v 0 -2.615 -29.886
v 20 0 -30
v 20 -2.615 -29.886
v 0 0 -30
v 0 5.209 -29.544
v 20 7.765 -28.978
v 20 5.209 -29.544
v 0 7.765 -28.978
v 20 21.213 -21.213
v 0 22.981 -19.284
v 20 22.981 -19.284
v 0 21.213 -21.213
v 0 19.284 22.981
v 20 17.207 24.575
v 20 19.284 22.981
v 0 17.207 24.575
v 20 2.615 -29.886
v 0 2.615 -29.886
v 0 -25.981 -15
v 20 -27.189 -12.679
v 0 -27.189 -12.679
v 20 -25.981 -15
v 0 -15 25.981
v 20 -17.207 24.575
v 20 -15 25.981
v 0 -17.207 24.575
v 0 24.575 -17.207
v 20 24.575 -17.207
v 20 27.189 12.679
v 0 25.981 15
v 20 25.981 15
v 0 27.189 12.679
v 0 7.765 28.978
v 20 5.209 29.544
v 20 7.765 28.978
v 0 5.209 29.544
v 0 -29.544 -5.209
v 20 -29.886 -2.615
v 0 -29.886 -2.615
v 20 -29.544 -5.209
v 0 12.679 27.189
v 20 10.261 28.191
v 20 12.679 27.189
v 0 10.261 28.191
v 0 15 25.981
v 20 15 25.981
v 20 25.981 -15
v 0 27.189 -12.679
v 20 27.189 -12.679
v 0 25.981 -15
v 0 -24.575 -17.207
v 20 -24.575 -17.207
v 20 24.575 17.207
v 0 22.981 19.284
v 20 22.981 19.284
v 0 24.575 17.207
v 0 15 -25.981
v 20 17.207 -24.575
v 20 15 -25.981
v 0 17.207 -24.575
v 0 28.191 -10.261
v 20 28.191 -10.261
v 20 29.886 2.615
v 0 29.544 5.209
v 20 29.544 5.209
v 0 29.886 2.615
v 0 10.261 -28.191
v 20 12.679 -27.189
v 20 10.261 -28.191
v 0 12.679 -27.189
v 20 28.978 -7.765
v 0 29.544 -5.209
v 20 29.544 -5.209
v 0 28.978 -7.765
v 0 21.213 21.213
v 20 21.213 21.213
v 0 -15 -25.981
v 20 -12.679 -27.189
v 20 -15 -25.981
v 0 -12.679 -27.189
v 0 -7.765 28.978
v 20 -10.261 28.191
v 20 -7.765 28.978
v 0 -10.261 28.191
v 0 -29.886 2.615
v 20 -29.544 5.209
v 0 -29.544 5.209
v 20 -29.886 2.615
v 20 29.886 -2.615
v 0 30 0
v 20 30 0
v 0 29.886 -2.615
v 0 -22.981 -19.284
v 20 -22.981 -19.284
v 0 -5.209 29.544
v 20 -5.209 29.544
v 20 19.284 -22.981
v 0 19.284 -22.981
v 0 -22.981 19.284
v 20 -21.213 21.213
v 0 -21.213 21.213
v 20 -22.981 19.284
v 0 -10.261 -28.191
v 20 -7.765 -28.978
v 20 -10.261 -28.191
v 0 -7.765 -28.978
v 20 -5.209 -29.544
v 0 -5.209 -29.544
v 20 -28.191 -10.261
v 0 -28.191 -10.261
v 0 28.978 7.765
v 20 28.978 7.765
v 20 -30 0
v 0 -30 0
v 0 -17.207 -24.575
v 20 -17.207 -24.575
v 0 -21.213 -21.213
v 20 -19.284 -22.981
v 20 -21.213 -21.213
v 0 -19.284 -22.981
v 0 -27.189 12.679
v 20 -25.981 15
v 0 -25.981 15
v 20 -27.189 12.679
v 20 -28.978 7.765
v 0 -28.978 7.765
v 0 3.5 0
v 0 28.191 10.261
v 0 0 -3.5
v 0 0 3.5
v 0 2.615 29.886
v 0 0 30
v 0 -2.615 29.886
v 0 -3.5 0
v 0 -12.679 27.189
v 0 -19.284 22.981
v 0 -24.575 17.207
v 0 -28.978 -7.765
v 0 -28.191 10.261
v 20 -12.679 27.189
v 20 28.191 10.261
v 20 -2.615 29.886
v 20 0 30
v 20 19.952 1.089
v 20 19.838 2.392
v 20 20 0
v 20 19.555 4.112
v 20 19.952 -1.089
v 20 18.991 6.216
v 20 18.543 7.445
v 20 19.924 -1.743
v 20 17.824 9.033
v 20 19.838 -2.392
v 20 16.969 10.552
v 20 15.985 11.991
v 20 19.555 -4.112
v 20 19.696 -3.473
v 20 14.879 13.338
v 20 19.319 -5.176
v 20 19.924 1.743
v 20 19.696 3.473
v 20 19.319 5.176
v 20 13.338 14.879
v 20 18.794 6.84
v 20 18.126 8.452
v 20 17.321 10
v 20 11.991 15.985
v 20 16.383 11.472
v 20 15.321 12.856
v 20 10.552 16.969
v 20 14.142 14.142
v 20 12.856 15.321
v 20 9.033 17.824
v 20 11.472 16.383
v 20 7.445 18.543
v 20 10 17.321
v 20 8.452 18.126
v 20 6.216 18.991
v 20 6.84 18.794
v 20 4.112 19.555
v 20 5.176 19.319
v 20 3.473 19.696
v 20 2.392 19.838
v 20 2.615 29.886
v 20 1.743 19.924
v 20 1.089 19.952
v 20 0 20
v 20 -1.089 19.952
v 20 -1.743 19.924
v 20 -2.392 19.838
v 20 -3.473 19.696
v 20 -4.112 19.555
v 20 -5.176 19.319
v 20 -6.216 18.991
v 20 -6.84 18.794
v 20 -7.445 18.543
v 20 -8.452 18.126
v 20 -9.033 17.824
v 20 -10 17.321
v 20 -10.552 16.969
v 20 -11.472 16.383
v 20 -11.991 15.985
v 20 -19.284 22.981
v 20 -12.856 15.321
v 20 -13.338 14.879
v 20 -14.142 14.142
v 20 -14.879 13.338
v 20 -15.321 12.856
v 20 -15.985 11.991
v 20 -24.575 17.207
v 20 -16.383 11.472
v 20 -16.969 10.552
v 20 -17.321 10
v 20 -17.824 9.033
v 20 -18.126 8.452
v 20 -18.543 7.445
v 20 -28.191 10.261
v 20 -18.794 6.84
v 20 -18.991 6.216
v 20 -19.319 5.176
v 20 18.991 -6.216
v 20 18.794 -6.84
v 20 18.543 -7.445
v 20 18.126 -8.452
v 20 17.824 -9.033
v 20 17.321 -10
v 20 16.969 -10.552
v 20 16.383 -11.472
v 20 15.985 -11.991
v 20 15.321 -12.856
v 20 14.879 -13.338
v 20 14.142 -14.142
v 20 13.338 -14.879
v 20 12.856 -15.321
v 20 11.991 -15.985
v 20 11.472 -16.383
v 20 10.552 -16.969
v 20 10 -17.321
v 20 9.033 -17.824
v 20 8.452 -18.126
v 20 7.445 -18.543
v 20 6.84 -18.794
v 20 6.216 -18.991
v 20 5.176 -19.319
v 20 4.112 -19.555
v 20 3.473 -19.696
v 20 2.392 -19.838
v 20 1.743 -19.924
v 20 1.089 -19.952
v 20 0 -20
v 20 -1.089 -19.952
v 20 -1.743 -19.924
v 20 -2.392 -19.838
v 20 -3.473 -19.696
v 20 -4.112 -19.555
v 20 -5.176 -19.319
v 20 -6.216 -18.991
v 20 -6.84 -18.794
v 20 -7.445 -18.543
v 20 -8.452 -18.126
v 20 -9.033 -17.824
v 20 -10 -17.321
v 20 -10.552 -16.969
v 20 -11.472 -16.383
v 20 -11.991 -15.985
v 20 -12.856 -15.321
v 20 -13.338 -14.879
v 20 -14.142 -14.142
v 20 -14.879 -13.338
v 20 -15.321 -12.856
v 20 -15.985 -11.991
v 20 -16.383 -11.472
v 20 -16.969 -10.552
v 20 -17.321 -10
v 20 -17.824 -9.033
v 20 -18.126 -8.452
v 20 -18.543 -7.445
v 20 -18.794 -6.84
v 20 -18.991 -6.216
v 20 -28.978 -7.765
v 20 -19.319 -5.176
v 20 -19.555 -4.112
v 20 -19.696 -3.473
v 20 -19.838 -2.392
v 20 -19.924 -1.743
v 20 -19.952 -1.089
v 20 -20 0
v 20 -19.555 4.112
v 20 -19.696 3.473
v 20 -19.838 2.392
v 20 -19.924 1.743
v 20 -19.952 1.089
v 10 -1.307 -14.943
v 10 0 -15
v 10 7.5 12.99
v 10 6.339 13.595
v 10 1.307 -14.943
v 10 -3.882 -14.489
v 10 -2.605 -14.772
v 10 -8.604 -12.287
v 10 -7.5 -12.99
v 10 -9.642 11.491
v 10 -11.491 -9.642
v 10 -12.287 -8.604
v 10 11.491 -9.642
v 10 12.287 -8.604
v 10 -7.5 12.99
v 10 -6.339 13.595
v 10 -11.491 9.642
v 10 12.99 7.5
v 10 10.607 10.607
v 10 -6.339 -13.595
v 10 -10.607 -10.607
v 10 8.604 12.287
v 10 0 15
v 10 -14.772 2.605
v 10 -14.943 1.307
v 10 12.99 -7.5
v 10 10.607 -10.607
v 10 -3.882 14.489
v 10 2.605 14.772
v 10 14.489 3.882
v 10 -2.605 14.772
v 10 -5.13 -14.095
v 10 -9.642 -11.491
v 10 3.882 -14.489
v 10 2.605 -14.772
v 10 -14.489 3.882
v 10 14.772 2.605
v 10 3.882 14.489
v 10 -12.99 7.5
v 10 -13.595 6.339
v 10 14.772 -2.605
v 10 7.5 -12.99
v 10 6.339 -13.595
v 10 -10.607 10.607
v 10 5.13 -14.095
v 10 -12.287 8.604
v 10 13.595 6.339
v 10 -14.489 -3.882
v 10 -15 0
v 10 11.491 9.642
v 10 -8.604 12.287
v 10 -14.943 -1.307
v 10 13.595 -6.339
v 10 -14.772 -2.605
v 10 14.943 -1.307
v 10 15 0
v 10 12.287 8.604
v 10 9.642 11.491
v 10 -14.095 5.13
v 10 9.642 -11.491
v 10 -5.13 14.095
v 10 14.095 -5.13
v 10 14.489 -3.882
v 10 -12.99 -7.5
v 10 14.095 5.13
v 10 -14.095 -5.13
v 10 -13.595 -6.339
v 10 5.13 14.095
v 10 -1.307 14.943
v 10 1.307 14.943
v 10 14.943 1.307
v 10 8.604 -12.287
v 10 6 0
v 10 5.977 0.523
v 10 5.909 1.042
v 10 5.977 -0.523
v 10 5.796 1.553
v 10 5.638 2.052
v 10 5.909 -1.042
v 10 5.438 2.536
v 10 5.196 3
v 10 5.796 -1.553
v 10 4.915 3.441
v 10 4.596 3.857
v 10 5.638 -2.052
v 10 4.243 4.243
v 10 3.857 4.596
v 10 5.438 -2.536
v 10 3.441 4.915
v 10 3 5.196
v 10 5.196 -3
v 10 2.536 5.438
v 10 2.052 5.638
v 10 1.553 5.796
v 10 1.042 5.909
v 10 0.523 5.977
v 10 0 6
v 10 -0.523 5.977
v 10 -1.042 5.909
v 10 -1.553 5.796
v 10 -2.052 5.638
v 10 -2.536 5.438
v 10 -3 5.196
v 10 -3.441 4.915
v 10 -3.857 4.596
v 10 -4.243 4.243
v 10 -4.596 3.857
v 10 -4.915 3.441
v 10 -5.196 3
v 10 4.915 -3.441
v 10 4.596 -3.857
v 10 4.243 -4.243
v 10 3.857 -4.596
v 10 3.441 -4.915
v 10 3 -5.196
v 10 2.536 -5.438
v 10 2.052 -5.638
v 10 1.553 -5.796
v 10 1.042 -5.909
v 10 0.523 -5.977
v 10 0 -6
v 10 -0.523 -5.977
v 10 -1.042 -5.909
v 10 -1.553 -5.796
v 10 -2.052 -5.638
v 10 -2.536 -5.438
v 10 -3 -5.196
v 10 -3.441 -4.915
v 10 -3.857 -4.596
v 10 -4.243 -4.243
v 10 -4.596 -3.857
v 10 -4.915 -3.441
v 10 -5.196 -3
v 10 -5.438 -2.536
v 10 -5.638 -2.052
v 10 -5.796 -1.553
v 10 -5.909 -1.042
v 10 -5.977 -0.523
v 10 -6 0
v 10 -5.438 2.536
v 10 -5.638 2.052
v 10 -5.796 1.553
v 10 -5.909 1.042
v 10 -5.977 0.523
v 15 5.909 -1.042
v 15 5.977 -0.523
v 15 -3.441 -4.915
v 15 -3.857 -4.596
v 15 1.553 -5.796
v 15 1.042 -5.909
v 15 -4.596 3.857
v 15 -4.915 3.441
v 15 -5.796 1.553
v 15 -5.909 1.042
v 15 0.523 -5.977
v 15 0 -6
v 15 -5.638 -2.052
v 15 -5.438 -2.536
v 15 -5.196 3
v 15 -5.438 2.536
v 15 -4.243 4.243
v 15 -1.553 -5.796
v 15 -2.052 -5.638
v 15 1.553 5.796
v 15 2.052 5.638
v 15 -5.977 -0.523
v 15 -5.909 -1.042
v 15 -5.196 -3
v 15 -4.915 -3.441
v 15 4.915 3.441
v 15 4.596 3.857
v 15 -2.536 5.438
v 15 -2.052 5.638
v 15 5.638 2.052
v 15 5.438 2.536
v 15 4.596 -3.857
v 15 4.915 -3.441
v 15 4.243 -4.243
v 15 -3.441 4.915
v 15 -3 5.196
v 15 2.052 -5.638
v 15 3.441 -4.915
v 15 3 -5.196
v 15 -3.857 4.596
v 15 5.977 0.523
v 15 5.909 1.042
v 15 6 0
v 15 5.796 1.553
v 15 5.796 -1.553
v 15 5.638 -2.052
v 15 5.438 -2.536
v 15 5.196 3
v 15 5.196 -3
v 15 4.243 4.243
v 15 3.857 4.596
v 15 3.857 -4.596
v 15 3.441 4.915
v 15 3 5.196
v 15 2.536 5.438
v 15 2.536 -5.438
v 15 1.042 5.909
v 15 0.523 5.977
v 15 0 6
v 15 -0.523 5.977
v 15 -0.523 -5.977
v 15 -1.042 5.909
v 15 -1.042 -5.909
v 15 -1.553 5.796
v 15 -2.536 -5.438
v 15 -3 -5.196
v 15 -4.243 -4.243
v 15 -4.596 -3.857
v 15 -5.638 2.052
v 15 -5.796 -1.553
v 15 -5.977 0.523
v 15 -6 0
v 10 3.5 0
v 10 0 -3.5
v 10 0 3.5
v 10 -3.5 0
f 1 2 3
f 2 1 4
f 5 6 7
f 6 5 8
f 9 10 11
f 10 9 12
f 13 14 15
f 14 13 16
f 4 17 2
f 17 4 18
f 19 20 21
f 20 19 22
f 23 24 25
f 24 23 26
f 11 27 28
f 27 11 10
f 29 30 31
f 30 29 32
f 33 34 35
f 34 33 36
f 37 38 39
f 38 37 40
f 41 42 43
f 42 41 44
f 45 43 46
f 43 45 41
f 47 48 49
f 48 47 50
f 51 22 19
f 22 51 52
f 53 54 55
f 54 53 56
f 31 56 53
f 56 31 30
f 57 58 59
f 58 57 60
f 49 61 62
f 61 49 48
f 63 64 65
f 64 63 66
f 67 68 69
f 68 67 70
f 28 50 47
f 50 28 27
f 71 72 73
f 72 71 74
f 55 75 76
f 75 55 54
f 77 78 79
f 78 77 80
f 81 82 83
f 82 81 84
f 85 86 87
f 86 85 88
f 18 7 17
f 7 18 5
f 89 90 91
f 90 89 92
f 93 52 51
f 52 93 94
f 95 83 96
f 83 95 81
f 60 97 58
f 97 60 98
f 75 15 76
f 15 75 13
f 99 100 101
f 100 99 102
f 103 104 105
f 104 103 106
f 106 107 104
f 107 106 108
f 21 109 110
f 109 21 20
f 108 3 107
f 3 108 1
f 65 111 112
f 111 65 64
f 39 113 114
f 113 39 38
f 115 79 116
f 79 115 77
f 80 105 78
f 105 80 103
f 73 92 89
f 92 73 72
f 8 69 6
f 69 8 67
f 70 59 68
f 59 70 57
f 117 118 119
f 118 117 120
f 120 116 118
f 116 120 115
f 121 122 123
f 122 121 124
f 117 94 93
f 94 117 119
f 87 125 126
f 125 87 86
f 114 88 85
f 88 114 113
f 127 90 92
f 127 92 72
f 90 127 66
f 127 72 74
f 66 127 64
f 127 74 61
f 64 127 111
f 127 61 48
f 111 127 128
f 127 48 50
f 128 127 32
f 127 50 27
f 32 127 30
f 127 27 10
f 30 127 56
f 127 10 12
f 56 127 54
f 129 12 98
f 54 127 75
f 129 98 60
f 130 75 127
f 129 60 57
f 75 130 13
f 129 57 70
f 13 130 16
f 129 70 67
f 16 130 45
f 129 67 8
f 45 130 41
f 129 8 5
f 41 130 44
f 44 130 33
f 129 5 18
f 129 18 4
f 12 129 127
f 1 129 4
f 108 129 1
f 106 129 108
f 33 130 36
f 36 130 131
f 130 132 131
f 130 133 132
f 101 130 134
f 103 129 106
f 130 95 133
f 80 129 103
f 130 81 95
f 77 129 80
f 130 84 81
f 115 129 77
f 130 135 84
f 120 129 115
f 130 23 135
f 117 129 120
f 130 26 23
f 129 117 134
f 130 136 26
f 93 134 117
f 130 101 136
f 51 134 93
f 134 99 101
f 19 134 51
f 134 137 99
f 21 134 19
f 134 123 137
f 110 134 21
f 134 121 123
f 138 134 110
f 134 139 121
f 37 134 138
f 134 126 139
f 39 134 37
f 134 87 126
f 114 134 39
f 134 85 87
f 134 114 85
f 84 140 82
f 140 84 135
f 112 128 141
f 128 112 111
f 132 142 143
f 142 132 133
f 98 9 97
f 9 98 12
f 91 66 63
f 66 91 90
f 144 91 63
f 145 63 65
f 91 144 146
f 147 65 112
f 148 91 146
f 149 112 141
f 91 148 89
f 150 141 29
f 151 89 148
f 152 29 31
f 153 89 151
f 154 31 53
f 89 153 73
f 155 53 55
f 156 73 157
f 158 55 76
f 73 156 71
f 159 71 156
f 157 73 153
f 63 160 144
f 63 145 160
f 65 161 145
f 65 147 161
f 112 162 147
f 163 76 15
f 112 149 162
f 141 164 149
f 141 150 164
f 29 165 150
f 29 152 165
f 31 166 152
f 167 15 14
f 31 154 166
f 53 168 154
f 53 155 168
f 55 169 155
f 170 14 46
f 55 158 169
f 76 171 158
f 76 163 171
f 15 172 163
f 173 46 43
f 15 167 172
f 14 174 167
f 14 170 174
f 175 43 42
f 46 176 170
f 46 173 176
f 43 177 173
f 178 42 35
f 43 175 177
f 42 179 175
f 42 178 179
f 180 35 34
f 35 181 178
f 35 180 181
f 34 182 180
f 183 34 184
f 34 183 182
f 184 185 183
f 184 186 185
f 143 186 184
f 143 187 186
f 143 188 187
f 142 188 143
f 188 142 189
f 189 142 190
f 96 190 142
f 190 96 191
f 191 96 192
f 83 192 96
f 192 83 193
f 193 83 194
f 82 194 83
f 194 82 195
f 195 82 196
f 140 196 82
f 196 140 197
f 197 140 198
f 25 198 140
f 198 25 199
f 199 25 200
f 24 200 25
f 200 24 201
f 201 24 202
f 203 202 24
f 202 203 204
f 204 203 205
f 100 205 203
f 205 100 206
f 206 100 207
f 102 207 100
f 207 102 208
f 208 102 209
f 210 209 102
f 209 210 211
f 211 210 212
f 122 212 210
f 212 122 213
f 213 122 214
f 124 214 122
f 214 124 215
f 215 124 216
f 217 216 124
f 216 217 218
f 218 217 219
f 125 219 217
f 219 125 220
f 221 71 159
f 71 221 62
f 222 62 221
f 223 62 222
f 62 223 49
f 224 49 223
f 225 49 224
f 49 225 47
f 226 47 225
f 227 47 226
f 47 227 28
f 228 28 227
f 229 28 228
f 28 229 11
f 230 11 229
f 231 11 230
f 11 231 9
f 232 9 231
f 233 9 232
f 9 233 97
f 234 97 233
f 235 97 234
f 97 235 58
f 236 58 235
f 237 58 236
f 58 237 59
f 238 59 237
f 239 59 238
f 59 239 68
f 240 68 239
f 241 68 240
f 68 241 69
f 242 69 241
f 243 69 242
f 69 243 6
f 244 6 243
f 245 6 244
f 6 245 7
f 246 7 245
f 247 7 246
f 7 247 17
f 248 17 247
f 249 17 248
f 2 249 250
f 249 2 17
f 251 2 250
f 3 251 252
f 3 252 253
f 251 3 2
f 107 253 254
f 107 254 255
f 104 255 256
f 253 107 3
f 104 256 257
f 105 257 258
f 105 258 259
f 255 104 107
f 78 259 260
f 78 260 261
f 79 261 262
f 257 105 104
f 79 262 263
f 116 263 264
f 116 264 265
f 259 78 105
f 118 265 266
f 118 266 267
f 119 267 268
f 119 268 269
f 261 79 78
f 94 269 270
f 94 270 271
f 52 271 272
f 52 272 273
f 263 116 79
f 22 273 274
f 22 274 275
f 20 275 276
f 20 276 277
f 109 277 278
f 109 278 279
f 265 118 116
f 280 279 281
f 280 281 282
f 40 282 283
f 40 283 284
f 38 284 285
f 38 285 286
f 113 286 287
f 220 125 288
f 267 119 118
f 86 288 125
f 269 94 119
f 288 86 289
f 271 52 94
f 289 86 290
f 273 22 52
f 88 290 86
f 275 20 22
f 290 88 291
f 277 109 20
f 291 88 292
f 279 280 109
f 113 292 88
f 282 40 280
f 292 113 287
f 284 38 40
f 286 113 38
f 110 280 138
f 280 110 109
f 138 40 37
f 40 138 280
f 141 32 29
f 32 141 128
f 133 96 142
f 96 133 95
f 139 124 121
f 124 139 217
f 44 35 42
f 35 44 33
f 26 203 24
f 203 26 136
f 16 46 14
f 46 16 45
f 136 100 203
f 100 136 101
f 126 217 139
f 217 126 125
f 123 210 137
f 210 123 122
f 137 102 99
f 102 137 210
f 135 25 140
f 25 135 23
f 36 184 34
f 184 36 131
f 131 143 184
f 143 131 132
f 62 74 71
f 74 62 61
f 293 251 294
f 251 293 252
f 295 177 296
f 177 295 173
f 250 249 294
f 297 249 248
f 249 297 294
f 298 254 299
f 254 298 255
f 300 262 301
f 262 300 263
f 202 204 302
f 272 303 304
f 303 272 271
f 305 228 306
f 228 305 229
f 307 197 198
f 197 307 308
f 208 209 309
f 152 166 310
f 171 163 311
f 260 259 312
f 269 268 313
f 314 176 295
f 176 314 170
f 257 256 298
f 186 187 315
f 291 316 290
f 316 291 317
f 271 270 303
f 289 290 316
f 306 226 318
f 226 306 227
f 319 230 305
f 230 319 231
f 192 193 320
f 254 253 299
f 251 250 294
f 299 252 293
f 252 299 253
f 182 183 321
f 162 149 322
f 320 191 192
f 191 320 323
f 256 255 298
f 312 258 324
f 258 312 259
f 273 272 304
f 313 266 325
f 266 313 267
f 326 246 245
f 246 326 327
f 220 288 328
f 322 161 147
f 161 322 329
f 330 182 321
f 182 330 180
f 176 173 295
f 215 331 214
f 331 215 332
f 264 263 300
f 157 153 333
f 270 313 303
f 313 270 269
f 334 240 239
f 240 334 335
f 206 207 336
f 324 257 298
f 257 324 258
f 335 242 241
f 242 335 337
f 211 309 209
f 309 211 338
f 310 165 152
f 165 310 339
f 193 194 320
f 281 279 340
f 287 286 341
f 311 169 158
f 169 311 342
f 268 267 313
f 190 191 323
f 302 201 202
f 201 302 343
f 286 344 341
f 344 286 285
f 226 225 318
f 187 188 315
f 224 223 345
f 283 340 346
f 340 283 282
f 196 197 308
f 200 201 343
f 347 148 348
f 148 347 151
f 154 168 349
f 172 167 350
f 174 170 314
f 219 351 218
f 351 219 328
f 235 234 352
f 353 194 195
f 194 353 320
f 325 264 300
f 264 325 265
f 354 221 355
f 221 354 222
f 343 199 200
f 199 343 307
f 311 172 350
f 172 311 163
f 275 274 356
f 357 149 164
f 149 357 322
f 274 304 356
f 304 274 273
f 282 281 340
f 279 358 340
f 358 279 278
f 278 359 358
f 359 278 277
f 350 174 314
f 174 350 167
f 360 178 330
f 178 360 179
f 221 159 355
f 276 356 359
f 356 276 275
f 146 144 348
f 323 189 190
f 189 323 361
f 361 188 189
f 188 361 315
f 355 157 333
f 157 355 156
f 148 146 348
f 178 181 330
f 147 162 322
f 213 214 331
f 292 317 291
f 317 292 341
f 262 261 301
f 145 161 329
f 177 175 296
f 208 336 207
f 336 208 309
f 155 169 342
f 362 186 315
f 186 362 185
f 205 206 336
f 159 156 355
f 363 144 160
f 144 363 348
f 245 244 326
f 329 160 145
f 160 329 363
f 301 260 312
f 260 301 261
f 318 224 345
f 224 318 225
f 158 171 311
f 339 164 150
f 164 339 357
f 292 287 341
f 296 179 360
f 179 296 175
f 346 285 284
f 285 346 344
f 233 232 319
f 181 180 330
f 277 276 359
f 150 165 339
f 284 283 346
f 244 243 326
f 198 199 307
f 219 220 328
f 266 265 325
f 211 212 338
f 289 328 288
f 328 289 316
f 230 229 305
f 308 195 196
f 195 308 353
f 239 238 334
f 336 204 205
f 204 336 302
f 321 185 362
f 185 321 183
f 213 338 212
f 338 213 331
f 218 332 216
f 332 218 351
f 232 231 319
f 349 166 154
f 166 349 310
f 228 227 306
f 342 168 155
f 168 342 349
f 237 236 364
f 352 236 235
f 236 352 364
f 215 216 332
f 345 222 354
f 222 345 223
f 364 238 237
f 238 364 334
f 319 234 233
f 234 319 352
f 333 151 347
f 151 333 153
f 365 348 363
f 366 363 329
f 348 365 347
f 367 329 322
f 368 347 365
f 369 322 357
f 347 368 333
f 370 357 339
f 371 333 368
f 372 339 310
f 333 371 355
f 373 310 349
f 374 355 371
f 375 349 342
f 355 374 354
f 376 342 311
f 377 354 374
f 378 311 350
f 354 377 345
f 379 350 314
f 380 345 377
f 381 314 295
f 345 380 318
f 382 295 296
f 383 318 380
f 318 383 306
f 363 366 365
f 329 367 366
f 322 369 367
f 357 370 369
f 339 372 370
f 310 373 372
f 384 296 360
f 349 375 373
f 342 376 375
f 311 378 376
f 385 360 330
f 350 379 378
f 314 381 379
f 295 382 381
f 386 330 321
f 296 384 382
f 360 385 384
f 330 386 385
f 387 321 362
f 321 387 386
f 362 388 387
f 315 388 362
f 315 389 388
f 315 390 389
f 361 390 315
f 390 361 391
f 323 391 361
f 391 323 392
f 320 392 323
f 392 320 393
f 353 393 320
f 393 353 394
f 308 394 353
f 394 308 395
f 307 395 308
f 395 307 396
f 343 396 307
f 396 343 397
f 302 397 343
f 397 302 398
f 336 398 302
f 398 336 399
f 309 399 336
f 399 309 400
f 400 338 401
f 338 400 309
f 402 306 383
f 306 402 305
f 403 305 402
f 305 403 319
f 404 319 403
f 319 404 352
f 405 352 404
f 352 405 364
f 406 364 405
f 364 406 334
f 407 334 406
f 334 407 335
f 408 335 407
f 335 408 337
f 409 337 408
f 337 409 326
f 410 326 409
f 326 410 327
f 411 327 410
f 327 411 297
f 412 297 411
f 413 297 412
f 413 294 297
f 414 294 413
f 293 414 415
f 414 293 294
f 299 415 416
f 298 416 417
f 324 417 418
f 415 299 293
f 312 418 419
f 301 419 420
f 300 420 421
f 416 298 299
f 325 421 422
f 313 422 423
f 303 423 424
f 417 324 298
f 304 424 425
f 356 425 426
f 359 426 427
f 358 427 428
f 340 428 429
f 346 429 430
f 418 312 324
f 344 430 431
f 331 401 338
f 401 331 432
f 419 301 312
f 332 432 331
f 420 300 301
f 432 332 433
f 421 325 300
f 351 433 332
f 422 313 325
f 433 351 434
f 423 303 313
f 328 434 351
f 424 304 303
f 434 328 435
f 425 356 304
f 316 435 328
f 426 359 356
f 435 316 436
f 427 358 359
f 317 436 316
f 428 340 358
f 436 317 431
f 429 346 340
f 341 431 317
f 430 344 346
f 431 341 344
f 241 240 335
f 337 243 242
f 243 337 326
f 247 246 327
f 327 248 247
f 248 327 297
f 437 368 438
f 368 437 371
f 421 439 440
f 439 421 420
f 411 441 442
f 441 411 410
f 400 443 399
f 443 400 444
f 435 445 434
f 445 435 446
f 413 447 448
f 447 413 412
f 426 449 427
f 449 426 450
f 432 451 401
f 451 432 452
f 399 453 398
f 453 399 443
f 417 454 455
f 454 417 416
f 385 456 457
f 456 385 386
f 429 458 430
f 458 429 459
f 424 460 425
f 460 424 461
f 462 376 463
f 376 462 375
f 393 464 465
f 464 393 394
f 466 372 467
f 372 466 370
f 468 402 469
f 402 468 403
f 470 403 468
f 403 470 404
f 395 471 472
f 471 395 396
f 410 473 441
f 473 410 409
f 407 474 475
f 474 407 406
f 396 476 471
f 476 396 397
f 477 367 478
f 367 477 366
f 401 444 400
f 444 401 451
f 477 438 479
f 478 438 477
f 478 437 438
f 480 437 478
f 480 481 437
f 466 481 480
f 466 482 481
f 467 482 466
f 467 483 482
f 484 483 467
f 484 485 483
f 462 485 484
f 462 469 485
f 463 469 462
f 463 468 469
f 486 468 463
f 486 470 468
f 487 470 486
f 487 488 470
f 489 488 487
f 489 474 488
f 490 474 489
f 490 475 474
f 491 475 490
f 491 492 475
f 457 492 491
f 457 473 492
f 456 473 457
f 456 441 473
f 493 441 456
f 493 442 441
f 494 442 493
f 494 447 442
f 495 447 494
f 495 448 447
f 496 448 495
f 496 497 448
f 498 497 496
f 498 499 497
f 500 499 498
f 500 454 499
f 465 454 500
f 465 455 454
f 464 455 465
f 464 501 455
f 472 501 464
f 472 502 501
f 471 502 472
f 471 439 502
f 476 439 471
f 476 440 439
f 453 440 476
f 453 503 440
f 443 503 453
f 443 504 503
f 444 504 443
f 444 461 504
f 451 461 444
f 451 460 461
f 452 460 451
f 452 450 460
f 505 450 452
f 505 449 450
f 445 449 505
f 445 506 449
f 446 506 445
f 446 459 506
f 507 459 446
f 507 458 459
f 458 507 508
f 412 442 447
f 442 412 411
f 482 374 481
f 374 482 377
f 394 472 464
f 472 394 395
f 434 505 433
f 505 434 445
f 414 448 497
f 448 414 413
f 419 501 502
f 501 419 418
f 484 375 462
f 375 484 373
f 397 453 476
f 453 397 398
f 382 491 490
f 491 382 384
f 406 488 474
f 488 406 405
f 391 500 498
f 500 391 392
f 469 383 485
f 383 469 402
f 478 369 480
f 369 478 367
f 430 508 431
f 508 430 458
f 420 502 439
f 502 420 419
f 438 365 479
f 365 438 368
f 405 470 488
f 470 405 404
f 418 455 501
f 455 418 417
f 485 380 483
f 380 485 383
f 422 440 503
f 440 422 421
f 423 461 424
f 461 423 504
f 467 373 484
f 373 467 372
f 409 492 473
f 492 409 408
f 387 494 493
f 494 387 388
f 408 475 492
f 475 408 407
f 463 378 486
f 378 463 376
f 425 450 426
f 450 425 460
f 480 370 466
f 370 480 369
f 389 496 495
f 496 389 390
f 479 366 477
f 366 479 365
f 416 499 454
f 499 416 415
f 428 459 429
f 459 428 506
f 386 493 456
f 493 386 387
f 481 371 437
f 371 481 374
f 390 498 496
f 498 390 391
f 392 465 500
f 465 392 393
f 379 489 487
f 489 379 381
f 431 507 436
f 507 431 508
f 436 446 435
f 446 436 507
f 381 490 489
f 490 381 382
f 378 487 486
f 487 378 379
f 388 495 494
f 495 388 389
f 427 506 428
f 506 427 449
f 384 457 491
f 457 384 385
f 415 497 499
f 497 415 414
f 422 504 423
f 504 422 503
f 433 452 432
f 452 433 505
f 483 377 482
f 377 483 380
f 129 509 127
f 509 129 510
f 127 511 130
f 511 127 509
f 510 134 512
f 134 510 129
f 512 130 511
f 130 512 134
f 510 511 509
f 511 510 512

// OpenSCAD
// this file defines the rear wheel


// global definitions
$fa = 5;
$fs = 0.5;


// shows rear wheel
rearWheel();


// rear wheel
module rearWheel()
{
  difference()
  {
    union()
    {
      difference()
      {
        // basic wheel
        rotate([0,90,0]) cylinder(d = 60,h = 20);

        // shape rim
        translate([10,0,0]) rotate([0,90,0]) cylinder(d1 = 30, d2 = 50, h = 20);
      }
      
      // support to hold shaft
      rotate([0,90,0]) cylinder(d = 12,h = 15);
    }
  
    // hole for shaft
    rotate([0,90,0]) cylinder(d = 7,h = 20, $fn = 4, center = true);
  }
}
